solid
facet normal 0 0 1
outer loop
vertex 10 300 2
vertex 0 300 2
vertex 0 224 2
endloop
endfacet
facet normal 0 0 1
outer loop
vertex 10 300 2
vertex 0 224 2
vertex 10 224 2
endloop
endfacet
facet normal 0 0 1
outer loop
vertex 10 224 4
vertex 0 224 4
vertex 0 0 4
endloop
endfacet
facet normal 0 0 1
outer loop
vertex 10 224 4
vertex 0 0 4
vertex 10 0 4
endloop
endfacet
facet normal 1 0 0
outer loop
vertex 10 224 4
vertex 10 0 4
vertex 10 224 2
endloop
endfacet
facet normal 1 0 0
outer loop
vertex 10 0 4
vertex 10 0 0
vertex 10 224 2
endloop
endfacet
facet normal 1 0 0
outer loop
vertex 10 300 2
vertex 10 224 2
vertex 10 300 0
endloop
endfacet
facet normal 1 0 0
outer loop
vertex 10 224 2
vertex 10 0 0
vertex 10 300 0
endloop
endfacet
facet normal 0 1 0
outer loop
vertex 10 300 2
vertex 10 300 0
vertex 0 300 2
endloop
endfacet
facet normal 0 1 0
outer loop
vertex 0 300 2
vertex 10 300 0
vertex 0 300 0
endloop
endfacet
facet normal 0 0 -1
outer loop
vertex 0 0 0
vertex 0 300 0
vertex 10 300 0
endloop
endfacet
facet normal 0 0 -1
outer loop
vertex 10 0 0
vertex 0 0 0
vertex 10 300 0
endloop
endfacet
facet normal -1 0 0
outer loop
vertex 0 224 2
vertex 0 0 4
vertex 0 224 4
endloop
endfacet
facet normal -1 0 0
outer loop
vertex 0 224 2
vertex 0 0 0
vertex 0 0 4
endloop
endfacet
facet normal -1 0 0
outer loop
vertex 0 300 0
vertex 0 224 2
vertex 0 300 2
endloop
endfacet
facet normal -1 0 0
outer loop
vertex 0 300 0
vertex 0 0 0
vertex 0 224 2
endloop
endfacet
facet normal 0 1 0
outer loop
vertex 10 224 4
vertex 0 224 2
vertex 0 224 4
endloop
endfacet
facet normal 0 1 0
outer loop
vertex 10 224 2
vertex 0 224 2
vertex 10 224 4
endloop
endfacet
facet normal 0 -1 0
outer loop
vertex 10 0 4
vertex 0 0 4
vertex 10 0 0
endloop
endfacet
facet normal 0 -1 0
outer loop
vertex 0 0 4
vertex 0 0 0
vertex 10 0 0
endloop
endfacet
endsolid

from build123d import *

# Parameters (mm, degrees)
F2_DEPTH = 2
F3_W     = 10
F3_H     = 224
F4_DEPTH = 2


with BuildPart() as f2:
    # F1 (on face) → F2 (new body)
    with BuildSketch(Plane.XY):
        Polygon((10, 300), (0, 300), (0, 224), (0, 0), (10, 0), align=None)
    extrude(amount=F2_DEPTH)

    # F3 (on face) → F4 (join)
    with BuildSketch(Plane.XY.offset(2)):
        with Locations((5, 112)):
            Rectangle(F3_W, F3_H)
    extrude(amount=F4_DEPTH)


solid = f2.part
